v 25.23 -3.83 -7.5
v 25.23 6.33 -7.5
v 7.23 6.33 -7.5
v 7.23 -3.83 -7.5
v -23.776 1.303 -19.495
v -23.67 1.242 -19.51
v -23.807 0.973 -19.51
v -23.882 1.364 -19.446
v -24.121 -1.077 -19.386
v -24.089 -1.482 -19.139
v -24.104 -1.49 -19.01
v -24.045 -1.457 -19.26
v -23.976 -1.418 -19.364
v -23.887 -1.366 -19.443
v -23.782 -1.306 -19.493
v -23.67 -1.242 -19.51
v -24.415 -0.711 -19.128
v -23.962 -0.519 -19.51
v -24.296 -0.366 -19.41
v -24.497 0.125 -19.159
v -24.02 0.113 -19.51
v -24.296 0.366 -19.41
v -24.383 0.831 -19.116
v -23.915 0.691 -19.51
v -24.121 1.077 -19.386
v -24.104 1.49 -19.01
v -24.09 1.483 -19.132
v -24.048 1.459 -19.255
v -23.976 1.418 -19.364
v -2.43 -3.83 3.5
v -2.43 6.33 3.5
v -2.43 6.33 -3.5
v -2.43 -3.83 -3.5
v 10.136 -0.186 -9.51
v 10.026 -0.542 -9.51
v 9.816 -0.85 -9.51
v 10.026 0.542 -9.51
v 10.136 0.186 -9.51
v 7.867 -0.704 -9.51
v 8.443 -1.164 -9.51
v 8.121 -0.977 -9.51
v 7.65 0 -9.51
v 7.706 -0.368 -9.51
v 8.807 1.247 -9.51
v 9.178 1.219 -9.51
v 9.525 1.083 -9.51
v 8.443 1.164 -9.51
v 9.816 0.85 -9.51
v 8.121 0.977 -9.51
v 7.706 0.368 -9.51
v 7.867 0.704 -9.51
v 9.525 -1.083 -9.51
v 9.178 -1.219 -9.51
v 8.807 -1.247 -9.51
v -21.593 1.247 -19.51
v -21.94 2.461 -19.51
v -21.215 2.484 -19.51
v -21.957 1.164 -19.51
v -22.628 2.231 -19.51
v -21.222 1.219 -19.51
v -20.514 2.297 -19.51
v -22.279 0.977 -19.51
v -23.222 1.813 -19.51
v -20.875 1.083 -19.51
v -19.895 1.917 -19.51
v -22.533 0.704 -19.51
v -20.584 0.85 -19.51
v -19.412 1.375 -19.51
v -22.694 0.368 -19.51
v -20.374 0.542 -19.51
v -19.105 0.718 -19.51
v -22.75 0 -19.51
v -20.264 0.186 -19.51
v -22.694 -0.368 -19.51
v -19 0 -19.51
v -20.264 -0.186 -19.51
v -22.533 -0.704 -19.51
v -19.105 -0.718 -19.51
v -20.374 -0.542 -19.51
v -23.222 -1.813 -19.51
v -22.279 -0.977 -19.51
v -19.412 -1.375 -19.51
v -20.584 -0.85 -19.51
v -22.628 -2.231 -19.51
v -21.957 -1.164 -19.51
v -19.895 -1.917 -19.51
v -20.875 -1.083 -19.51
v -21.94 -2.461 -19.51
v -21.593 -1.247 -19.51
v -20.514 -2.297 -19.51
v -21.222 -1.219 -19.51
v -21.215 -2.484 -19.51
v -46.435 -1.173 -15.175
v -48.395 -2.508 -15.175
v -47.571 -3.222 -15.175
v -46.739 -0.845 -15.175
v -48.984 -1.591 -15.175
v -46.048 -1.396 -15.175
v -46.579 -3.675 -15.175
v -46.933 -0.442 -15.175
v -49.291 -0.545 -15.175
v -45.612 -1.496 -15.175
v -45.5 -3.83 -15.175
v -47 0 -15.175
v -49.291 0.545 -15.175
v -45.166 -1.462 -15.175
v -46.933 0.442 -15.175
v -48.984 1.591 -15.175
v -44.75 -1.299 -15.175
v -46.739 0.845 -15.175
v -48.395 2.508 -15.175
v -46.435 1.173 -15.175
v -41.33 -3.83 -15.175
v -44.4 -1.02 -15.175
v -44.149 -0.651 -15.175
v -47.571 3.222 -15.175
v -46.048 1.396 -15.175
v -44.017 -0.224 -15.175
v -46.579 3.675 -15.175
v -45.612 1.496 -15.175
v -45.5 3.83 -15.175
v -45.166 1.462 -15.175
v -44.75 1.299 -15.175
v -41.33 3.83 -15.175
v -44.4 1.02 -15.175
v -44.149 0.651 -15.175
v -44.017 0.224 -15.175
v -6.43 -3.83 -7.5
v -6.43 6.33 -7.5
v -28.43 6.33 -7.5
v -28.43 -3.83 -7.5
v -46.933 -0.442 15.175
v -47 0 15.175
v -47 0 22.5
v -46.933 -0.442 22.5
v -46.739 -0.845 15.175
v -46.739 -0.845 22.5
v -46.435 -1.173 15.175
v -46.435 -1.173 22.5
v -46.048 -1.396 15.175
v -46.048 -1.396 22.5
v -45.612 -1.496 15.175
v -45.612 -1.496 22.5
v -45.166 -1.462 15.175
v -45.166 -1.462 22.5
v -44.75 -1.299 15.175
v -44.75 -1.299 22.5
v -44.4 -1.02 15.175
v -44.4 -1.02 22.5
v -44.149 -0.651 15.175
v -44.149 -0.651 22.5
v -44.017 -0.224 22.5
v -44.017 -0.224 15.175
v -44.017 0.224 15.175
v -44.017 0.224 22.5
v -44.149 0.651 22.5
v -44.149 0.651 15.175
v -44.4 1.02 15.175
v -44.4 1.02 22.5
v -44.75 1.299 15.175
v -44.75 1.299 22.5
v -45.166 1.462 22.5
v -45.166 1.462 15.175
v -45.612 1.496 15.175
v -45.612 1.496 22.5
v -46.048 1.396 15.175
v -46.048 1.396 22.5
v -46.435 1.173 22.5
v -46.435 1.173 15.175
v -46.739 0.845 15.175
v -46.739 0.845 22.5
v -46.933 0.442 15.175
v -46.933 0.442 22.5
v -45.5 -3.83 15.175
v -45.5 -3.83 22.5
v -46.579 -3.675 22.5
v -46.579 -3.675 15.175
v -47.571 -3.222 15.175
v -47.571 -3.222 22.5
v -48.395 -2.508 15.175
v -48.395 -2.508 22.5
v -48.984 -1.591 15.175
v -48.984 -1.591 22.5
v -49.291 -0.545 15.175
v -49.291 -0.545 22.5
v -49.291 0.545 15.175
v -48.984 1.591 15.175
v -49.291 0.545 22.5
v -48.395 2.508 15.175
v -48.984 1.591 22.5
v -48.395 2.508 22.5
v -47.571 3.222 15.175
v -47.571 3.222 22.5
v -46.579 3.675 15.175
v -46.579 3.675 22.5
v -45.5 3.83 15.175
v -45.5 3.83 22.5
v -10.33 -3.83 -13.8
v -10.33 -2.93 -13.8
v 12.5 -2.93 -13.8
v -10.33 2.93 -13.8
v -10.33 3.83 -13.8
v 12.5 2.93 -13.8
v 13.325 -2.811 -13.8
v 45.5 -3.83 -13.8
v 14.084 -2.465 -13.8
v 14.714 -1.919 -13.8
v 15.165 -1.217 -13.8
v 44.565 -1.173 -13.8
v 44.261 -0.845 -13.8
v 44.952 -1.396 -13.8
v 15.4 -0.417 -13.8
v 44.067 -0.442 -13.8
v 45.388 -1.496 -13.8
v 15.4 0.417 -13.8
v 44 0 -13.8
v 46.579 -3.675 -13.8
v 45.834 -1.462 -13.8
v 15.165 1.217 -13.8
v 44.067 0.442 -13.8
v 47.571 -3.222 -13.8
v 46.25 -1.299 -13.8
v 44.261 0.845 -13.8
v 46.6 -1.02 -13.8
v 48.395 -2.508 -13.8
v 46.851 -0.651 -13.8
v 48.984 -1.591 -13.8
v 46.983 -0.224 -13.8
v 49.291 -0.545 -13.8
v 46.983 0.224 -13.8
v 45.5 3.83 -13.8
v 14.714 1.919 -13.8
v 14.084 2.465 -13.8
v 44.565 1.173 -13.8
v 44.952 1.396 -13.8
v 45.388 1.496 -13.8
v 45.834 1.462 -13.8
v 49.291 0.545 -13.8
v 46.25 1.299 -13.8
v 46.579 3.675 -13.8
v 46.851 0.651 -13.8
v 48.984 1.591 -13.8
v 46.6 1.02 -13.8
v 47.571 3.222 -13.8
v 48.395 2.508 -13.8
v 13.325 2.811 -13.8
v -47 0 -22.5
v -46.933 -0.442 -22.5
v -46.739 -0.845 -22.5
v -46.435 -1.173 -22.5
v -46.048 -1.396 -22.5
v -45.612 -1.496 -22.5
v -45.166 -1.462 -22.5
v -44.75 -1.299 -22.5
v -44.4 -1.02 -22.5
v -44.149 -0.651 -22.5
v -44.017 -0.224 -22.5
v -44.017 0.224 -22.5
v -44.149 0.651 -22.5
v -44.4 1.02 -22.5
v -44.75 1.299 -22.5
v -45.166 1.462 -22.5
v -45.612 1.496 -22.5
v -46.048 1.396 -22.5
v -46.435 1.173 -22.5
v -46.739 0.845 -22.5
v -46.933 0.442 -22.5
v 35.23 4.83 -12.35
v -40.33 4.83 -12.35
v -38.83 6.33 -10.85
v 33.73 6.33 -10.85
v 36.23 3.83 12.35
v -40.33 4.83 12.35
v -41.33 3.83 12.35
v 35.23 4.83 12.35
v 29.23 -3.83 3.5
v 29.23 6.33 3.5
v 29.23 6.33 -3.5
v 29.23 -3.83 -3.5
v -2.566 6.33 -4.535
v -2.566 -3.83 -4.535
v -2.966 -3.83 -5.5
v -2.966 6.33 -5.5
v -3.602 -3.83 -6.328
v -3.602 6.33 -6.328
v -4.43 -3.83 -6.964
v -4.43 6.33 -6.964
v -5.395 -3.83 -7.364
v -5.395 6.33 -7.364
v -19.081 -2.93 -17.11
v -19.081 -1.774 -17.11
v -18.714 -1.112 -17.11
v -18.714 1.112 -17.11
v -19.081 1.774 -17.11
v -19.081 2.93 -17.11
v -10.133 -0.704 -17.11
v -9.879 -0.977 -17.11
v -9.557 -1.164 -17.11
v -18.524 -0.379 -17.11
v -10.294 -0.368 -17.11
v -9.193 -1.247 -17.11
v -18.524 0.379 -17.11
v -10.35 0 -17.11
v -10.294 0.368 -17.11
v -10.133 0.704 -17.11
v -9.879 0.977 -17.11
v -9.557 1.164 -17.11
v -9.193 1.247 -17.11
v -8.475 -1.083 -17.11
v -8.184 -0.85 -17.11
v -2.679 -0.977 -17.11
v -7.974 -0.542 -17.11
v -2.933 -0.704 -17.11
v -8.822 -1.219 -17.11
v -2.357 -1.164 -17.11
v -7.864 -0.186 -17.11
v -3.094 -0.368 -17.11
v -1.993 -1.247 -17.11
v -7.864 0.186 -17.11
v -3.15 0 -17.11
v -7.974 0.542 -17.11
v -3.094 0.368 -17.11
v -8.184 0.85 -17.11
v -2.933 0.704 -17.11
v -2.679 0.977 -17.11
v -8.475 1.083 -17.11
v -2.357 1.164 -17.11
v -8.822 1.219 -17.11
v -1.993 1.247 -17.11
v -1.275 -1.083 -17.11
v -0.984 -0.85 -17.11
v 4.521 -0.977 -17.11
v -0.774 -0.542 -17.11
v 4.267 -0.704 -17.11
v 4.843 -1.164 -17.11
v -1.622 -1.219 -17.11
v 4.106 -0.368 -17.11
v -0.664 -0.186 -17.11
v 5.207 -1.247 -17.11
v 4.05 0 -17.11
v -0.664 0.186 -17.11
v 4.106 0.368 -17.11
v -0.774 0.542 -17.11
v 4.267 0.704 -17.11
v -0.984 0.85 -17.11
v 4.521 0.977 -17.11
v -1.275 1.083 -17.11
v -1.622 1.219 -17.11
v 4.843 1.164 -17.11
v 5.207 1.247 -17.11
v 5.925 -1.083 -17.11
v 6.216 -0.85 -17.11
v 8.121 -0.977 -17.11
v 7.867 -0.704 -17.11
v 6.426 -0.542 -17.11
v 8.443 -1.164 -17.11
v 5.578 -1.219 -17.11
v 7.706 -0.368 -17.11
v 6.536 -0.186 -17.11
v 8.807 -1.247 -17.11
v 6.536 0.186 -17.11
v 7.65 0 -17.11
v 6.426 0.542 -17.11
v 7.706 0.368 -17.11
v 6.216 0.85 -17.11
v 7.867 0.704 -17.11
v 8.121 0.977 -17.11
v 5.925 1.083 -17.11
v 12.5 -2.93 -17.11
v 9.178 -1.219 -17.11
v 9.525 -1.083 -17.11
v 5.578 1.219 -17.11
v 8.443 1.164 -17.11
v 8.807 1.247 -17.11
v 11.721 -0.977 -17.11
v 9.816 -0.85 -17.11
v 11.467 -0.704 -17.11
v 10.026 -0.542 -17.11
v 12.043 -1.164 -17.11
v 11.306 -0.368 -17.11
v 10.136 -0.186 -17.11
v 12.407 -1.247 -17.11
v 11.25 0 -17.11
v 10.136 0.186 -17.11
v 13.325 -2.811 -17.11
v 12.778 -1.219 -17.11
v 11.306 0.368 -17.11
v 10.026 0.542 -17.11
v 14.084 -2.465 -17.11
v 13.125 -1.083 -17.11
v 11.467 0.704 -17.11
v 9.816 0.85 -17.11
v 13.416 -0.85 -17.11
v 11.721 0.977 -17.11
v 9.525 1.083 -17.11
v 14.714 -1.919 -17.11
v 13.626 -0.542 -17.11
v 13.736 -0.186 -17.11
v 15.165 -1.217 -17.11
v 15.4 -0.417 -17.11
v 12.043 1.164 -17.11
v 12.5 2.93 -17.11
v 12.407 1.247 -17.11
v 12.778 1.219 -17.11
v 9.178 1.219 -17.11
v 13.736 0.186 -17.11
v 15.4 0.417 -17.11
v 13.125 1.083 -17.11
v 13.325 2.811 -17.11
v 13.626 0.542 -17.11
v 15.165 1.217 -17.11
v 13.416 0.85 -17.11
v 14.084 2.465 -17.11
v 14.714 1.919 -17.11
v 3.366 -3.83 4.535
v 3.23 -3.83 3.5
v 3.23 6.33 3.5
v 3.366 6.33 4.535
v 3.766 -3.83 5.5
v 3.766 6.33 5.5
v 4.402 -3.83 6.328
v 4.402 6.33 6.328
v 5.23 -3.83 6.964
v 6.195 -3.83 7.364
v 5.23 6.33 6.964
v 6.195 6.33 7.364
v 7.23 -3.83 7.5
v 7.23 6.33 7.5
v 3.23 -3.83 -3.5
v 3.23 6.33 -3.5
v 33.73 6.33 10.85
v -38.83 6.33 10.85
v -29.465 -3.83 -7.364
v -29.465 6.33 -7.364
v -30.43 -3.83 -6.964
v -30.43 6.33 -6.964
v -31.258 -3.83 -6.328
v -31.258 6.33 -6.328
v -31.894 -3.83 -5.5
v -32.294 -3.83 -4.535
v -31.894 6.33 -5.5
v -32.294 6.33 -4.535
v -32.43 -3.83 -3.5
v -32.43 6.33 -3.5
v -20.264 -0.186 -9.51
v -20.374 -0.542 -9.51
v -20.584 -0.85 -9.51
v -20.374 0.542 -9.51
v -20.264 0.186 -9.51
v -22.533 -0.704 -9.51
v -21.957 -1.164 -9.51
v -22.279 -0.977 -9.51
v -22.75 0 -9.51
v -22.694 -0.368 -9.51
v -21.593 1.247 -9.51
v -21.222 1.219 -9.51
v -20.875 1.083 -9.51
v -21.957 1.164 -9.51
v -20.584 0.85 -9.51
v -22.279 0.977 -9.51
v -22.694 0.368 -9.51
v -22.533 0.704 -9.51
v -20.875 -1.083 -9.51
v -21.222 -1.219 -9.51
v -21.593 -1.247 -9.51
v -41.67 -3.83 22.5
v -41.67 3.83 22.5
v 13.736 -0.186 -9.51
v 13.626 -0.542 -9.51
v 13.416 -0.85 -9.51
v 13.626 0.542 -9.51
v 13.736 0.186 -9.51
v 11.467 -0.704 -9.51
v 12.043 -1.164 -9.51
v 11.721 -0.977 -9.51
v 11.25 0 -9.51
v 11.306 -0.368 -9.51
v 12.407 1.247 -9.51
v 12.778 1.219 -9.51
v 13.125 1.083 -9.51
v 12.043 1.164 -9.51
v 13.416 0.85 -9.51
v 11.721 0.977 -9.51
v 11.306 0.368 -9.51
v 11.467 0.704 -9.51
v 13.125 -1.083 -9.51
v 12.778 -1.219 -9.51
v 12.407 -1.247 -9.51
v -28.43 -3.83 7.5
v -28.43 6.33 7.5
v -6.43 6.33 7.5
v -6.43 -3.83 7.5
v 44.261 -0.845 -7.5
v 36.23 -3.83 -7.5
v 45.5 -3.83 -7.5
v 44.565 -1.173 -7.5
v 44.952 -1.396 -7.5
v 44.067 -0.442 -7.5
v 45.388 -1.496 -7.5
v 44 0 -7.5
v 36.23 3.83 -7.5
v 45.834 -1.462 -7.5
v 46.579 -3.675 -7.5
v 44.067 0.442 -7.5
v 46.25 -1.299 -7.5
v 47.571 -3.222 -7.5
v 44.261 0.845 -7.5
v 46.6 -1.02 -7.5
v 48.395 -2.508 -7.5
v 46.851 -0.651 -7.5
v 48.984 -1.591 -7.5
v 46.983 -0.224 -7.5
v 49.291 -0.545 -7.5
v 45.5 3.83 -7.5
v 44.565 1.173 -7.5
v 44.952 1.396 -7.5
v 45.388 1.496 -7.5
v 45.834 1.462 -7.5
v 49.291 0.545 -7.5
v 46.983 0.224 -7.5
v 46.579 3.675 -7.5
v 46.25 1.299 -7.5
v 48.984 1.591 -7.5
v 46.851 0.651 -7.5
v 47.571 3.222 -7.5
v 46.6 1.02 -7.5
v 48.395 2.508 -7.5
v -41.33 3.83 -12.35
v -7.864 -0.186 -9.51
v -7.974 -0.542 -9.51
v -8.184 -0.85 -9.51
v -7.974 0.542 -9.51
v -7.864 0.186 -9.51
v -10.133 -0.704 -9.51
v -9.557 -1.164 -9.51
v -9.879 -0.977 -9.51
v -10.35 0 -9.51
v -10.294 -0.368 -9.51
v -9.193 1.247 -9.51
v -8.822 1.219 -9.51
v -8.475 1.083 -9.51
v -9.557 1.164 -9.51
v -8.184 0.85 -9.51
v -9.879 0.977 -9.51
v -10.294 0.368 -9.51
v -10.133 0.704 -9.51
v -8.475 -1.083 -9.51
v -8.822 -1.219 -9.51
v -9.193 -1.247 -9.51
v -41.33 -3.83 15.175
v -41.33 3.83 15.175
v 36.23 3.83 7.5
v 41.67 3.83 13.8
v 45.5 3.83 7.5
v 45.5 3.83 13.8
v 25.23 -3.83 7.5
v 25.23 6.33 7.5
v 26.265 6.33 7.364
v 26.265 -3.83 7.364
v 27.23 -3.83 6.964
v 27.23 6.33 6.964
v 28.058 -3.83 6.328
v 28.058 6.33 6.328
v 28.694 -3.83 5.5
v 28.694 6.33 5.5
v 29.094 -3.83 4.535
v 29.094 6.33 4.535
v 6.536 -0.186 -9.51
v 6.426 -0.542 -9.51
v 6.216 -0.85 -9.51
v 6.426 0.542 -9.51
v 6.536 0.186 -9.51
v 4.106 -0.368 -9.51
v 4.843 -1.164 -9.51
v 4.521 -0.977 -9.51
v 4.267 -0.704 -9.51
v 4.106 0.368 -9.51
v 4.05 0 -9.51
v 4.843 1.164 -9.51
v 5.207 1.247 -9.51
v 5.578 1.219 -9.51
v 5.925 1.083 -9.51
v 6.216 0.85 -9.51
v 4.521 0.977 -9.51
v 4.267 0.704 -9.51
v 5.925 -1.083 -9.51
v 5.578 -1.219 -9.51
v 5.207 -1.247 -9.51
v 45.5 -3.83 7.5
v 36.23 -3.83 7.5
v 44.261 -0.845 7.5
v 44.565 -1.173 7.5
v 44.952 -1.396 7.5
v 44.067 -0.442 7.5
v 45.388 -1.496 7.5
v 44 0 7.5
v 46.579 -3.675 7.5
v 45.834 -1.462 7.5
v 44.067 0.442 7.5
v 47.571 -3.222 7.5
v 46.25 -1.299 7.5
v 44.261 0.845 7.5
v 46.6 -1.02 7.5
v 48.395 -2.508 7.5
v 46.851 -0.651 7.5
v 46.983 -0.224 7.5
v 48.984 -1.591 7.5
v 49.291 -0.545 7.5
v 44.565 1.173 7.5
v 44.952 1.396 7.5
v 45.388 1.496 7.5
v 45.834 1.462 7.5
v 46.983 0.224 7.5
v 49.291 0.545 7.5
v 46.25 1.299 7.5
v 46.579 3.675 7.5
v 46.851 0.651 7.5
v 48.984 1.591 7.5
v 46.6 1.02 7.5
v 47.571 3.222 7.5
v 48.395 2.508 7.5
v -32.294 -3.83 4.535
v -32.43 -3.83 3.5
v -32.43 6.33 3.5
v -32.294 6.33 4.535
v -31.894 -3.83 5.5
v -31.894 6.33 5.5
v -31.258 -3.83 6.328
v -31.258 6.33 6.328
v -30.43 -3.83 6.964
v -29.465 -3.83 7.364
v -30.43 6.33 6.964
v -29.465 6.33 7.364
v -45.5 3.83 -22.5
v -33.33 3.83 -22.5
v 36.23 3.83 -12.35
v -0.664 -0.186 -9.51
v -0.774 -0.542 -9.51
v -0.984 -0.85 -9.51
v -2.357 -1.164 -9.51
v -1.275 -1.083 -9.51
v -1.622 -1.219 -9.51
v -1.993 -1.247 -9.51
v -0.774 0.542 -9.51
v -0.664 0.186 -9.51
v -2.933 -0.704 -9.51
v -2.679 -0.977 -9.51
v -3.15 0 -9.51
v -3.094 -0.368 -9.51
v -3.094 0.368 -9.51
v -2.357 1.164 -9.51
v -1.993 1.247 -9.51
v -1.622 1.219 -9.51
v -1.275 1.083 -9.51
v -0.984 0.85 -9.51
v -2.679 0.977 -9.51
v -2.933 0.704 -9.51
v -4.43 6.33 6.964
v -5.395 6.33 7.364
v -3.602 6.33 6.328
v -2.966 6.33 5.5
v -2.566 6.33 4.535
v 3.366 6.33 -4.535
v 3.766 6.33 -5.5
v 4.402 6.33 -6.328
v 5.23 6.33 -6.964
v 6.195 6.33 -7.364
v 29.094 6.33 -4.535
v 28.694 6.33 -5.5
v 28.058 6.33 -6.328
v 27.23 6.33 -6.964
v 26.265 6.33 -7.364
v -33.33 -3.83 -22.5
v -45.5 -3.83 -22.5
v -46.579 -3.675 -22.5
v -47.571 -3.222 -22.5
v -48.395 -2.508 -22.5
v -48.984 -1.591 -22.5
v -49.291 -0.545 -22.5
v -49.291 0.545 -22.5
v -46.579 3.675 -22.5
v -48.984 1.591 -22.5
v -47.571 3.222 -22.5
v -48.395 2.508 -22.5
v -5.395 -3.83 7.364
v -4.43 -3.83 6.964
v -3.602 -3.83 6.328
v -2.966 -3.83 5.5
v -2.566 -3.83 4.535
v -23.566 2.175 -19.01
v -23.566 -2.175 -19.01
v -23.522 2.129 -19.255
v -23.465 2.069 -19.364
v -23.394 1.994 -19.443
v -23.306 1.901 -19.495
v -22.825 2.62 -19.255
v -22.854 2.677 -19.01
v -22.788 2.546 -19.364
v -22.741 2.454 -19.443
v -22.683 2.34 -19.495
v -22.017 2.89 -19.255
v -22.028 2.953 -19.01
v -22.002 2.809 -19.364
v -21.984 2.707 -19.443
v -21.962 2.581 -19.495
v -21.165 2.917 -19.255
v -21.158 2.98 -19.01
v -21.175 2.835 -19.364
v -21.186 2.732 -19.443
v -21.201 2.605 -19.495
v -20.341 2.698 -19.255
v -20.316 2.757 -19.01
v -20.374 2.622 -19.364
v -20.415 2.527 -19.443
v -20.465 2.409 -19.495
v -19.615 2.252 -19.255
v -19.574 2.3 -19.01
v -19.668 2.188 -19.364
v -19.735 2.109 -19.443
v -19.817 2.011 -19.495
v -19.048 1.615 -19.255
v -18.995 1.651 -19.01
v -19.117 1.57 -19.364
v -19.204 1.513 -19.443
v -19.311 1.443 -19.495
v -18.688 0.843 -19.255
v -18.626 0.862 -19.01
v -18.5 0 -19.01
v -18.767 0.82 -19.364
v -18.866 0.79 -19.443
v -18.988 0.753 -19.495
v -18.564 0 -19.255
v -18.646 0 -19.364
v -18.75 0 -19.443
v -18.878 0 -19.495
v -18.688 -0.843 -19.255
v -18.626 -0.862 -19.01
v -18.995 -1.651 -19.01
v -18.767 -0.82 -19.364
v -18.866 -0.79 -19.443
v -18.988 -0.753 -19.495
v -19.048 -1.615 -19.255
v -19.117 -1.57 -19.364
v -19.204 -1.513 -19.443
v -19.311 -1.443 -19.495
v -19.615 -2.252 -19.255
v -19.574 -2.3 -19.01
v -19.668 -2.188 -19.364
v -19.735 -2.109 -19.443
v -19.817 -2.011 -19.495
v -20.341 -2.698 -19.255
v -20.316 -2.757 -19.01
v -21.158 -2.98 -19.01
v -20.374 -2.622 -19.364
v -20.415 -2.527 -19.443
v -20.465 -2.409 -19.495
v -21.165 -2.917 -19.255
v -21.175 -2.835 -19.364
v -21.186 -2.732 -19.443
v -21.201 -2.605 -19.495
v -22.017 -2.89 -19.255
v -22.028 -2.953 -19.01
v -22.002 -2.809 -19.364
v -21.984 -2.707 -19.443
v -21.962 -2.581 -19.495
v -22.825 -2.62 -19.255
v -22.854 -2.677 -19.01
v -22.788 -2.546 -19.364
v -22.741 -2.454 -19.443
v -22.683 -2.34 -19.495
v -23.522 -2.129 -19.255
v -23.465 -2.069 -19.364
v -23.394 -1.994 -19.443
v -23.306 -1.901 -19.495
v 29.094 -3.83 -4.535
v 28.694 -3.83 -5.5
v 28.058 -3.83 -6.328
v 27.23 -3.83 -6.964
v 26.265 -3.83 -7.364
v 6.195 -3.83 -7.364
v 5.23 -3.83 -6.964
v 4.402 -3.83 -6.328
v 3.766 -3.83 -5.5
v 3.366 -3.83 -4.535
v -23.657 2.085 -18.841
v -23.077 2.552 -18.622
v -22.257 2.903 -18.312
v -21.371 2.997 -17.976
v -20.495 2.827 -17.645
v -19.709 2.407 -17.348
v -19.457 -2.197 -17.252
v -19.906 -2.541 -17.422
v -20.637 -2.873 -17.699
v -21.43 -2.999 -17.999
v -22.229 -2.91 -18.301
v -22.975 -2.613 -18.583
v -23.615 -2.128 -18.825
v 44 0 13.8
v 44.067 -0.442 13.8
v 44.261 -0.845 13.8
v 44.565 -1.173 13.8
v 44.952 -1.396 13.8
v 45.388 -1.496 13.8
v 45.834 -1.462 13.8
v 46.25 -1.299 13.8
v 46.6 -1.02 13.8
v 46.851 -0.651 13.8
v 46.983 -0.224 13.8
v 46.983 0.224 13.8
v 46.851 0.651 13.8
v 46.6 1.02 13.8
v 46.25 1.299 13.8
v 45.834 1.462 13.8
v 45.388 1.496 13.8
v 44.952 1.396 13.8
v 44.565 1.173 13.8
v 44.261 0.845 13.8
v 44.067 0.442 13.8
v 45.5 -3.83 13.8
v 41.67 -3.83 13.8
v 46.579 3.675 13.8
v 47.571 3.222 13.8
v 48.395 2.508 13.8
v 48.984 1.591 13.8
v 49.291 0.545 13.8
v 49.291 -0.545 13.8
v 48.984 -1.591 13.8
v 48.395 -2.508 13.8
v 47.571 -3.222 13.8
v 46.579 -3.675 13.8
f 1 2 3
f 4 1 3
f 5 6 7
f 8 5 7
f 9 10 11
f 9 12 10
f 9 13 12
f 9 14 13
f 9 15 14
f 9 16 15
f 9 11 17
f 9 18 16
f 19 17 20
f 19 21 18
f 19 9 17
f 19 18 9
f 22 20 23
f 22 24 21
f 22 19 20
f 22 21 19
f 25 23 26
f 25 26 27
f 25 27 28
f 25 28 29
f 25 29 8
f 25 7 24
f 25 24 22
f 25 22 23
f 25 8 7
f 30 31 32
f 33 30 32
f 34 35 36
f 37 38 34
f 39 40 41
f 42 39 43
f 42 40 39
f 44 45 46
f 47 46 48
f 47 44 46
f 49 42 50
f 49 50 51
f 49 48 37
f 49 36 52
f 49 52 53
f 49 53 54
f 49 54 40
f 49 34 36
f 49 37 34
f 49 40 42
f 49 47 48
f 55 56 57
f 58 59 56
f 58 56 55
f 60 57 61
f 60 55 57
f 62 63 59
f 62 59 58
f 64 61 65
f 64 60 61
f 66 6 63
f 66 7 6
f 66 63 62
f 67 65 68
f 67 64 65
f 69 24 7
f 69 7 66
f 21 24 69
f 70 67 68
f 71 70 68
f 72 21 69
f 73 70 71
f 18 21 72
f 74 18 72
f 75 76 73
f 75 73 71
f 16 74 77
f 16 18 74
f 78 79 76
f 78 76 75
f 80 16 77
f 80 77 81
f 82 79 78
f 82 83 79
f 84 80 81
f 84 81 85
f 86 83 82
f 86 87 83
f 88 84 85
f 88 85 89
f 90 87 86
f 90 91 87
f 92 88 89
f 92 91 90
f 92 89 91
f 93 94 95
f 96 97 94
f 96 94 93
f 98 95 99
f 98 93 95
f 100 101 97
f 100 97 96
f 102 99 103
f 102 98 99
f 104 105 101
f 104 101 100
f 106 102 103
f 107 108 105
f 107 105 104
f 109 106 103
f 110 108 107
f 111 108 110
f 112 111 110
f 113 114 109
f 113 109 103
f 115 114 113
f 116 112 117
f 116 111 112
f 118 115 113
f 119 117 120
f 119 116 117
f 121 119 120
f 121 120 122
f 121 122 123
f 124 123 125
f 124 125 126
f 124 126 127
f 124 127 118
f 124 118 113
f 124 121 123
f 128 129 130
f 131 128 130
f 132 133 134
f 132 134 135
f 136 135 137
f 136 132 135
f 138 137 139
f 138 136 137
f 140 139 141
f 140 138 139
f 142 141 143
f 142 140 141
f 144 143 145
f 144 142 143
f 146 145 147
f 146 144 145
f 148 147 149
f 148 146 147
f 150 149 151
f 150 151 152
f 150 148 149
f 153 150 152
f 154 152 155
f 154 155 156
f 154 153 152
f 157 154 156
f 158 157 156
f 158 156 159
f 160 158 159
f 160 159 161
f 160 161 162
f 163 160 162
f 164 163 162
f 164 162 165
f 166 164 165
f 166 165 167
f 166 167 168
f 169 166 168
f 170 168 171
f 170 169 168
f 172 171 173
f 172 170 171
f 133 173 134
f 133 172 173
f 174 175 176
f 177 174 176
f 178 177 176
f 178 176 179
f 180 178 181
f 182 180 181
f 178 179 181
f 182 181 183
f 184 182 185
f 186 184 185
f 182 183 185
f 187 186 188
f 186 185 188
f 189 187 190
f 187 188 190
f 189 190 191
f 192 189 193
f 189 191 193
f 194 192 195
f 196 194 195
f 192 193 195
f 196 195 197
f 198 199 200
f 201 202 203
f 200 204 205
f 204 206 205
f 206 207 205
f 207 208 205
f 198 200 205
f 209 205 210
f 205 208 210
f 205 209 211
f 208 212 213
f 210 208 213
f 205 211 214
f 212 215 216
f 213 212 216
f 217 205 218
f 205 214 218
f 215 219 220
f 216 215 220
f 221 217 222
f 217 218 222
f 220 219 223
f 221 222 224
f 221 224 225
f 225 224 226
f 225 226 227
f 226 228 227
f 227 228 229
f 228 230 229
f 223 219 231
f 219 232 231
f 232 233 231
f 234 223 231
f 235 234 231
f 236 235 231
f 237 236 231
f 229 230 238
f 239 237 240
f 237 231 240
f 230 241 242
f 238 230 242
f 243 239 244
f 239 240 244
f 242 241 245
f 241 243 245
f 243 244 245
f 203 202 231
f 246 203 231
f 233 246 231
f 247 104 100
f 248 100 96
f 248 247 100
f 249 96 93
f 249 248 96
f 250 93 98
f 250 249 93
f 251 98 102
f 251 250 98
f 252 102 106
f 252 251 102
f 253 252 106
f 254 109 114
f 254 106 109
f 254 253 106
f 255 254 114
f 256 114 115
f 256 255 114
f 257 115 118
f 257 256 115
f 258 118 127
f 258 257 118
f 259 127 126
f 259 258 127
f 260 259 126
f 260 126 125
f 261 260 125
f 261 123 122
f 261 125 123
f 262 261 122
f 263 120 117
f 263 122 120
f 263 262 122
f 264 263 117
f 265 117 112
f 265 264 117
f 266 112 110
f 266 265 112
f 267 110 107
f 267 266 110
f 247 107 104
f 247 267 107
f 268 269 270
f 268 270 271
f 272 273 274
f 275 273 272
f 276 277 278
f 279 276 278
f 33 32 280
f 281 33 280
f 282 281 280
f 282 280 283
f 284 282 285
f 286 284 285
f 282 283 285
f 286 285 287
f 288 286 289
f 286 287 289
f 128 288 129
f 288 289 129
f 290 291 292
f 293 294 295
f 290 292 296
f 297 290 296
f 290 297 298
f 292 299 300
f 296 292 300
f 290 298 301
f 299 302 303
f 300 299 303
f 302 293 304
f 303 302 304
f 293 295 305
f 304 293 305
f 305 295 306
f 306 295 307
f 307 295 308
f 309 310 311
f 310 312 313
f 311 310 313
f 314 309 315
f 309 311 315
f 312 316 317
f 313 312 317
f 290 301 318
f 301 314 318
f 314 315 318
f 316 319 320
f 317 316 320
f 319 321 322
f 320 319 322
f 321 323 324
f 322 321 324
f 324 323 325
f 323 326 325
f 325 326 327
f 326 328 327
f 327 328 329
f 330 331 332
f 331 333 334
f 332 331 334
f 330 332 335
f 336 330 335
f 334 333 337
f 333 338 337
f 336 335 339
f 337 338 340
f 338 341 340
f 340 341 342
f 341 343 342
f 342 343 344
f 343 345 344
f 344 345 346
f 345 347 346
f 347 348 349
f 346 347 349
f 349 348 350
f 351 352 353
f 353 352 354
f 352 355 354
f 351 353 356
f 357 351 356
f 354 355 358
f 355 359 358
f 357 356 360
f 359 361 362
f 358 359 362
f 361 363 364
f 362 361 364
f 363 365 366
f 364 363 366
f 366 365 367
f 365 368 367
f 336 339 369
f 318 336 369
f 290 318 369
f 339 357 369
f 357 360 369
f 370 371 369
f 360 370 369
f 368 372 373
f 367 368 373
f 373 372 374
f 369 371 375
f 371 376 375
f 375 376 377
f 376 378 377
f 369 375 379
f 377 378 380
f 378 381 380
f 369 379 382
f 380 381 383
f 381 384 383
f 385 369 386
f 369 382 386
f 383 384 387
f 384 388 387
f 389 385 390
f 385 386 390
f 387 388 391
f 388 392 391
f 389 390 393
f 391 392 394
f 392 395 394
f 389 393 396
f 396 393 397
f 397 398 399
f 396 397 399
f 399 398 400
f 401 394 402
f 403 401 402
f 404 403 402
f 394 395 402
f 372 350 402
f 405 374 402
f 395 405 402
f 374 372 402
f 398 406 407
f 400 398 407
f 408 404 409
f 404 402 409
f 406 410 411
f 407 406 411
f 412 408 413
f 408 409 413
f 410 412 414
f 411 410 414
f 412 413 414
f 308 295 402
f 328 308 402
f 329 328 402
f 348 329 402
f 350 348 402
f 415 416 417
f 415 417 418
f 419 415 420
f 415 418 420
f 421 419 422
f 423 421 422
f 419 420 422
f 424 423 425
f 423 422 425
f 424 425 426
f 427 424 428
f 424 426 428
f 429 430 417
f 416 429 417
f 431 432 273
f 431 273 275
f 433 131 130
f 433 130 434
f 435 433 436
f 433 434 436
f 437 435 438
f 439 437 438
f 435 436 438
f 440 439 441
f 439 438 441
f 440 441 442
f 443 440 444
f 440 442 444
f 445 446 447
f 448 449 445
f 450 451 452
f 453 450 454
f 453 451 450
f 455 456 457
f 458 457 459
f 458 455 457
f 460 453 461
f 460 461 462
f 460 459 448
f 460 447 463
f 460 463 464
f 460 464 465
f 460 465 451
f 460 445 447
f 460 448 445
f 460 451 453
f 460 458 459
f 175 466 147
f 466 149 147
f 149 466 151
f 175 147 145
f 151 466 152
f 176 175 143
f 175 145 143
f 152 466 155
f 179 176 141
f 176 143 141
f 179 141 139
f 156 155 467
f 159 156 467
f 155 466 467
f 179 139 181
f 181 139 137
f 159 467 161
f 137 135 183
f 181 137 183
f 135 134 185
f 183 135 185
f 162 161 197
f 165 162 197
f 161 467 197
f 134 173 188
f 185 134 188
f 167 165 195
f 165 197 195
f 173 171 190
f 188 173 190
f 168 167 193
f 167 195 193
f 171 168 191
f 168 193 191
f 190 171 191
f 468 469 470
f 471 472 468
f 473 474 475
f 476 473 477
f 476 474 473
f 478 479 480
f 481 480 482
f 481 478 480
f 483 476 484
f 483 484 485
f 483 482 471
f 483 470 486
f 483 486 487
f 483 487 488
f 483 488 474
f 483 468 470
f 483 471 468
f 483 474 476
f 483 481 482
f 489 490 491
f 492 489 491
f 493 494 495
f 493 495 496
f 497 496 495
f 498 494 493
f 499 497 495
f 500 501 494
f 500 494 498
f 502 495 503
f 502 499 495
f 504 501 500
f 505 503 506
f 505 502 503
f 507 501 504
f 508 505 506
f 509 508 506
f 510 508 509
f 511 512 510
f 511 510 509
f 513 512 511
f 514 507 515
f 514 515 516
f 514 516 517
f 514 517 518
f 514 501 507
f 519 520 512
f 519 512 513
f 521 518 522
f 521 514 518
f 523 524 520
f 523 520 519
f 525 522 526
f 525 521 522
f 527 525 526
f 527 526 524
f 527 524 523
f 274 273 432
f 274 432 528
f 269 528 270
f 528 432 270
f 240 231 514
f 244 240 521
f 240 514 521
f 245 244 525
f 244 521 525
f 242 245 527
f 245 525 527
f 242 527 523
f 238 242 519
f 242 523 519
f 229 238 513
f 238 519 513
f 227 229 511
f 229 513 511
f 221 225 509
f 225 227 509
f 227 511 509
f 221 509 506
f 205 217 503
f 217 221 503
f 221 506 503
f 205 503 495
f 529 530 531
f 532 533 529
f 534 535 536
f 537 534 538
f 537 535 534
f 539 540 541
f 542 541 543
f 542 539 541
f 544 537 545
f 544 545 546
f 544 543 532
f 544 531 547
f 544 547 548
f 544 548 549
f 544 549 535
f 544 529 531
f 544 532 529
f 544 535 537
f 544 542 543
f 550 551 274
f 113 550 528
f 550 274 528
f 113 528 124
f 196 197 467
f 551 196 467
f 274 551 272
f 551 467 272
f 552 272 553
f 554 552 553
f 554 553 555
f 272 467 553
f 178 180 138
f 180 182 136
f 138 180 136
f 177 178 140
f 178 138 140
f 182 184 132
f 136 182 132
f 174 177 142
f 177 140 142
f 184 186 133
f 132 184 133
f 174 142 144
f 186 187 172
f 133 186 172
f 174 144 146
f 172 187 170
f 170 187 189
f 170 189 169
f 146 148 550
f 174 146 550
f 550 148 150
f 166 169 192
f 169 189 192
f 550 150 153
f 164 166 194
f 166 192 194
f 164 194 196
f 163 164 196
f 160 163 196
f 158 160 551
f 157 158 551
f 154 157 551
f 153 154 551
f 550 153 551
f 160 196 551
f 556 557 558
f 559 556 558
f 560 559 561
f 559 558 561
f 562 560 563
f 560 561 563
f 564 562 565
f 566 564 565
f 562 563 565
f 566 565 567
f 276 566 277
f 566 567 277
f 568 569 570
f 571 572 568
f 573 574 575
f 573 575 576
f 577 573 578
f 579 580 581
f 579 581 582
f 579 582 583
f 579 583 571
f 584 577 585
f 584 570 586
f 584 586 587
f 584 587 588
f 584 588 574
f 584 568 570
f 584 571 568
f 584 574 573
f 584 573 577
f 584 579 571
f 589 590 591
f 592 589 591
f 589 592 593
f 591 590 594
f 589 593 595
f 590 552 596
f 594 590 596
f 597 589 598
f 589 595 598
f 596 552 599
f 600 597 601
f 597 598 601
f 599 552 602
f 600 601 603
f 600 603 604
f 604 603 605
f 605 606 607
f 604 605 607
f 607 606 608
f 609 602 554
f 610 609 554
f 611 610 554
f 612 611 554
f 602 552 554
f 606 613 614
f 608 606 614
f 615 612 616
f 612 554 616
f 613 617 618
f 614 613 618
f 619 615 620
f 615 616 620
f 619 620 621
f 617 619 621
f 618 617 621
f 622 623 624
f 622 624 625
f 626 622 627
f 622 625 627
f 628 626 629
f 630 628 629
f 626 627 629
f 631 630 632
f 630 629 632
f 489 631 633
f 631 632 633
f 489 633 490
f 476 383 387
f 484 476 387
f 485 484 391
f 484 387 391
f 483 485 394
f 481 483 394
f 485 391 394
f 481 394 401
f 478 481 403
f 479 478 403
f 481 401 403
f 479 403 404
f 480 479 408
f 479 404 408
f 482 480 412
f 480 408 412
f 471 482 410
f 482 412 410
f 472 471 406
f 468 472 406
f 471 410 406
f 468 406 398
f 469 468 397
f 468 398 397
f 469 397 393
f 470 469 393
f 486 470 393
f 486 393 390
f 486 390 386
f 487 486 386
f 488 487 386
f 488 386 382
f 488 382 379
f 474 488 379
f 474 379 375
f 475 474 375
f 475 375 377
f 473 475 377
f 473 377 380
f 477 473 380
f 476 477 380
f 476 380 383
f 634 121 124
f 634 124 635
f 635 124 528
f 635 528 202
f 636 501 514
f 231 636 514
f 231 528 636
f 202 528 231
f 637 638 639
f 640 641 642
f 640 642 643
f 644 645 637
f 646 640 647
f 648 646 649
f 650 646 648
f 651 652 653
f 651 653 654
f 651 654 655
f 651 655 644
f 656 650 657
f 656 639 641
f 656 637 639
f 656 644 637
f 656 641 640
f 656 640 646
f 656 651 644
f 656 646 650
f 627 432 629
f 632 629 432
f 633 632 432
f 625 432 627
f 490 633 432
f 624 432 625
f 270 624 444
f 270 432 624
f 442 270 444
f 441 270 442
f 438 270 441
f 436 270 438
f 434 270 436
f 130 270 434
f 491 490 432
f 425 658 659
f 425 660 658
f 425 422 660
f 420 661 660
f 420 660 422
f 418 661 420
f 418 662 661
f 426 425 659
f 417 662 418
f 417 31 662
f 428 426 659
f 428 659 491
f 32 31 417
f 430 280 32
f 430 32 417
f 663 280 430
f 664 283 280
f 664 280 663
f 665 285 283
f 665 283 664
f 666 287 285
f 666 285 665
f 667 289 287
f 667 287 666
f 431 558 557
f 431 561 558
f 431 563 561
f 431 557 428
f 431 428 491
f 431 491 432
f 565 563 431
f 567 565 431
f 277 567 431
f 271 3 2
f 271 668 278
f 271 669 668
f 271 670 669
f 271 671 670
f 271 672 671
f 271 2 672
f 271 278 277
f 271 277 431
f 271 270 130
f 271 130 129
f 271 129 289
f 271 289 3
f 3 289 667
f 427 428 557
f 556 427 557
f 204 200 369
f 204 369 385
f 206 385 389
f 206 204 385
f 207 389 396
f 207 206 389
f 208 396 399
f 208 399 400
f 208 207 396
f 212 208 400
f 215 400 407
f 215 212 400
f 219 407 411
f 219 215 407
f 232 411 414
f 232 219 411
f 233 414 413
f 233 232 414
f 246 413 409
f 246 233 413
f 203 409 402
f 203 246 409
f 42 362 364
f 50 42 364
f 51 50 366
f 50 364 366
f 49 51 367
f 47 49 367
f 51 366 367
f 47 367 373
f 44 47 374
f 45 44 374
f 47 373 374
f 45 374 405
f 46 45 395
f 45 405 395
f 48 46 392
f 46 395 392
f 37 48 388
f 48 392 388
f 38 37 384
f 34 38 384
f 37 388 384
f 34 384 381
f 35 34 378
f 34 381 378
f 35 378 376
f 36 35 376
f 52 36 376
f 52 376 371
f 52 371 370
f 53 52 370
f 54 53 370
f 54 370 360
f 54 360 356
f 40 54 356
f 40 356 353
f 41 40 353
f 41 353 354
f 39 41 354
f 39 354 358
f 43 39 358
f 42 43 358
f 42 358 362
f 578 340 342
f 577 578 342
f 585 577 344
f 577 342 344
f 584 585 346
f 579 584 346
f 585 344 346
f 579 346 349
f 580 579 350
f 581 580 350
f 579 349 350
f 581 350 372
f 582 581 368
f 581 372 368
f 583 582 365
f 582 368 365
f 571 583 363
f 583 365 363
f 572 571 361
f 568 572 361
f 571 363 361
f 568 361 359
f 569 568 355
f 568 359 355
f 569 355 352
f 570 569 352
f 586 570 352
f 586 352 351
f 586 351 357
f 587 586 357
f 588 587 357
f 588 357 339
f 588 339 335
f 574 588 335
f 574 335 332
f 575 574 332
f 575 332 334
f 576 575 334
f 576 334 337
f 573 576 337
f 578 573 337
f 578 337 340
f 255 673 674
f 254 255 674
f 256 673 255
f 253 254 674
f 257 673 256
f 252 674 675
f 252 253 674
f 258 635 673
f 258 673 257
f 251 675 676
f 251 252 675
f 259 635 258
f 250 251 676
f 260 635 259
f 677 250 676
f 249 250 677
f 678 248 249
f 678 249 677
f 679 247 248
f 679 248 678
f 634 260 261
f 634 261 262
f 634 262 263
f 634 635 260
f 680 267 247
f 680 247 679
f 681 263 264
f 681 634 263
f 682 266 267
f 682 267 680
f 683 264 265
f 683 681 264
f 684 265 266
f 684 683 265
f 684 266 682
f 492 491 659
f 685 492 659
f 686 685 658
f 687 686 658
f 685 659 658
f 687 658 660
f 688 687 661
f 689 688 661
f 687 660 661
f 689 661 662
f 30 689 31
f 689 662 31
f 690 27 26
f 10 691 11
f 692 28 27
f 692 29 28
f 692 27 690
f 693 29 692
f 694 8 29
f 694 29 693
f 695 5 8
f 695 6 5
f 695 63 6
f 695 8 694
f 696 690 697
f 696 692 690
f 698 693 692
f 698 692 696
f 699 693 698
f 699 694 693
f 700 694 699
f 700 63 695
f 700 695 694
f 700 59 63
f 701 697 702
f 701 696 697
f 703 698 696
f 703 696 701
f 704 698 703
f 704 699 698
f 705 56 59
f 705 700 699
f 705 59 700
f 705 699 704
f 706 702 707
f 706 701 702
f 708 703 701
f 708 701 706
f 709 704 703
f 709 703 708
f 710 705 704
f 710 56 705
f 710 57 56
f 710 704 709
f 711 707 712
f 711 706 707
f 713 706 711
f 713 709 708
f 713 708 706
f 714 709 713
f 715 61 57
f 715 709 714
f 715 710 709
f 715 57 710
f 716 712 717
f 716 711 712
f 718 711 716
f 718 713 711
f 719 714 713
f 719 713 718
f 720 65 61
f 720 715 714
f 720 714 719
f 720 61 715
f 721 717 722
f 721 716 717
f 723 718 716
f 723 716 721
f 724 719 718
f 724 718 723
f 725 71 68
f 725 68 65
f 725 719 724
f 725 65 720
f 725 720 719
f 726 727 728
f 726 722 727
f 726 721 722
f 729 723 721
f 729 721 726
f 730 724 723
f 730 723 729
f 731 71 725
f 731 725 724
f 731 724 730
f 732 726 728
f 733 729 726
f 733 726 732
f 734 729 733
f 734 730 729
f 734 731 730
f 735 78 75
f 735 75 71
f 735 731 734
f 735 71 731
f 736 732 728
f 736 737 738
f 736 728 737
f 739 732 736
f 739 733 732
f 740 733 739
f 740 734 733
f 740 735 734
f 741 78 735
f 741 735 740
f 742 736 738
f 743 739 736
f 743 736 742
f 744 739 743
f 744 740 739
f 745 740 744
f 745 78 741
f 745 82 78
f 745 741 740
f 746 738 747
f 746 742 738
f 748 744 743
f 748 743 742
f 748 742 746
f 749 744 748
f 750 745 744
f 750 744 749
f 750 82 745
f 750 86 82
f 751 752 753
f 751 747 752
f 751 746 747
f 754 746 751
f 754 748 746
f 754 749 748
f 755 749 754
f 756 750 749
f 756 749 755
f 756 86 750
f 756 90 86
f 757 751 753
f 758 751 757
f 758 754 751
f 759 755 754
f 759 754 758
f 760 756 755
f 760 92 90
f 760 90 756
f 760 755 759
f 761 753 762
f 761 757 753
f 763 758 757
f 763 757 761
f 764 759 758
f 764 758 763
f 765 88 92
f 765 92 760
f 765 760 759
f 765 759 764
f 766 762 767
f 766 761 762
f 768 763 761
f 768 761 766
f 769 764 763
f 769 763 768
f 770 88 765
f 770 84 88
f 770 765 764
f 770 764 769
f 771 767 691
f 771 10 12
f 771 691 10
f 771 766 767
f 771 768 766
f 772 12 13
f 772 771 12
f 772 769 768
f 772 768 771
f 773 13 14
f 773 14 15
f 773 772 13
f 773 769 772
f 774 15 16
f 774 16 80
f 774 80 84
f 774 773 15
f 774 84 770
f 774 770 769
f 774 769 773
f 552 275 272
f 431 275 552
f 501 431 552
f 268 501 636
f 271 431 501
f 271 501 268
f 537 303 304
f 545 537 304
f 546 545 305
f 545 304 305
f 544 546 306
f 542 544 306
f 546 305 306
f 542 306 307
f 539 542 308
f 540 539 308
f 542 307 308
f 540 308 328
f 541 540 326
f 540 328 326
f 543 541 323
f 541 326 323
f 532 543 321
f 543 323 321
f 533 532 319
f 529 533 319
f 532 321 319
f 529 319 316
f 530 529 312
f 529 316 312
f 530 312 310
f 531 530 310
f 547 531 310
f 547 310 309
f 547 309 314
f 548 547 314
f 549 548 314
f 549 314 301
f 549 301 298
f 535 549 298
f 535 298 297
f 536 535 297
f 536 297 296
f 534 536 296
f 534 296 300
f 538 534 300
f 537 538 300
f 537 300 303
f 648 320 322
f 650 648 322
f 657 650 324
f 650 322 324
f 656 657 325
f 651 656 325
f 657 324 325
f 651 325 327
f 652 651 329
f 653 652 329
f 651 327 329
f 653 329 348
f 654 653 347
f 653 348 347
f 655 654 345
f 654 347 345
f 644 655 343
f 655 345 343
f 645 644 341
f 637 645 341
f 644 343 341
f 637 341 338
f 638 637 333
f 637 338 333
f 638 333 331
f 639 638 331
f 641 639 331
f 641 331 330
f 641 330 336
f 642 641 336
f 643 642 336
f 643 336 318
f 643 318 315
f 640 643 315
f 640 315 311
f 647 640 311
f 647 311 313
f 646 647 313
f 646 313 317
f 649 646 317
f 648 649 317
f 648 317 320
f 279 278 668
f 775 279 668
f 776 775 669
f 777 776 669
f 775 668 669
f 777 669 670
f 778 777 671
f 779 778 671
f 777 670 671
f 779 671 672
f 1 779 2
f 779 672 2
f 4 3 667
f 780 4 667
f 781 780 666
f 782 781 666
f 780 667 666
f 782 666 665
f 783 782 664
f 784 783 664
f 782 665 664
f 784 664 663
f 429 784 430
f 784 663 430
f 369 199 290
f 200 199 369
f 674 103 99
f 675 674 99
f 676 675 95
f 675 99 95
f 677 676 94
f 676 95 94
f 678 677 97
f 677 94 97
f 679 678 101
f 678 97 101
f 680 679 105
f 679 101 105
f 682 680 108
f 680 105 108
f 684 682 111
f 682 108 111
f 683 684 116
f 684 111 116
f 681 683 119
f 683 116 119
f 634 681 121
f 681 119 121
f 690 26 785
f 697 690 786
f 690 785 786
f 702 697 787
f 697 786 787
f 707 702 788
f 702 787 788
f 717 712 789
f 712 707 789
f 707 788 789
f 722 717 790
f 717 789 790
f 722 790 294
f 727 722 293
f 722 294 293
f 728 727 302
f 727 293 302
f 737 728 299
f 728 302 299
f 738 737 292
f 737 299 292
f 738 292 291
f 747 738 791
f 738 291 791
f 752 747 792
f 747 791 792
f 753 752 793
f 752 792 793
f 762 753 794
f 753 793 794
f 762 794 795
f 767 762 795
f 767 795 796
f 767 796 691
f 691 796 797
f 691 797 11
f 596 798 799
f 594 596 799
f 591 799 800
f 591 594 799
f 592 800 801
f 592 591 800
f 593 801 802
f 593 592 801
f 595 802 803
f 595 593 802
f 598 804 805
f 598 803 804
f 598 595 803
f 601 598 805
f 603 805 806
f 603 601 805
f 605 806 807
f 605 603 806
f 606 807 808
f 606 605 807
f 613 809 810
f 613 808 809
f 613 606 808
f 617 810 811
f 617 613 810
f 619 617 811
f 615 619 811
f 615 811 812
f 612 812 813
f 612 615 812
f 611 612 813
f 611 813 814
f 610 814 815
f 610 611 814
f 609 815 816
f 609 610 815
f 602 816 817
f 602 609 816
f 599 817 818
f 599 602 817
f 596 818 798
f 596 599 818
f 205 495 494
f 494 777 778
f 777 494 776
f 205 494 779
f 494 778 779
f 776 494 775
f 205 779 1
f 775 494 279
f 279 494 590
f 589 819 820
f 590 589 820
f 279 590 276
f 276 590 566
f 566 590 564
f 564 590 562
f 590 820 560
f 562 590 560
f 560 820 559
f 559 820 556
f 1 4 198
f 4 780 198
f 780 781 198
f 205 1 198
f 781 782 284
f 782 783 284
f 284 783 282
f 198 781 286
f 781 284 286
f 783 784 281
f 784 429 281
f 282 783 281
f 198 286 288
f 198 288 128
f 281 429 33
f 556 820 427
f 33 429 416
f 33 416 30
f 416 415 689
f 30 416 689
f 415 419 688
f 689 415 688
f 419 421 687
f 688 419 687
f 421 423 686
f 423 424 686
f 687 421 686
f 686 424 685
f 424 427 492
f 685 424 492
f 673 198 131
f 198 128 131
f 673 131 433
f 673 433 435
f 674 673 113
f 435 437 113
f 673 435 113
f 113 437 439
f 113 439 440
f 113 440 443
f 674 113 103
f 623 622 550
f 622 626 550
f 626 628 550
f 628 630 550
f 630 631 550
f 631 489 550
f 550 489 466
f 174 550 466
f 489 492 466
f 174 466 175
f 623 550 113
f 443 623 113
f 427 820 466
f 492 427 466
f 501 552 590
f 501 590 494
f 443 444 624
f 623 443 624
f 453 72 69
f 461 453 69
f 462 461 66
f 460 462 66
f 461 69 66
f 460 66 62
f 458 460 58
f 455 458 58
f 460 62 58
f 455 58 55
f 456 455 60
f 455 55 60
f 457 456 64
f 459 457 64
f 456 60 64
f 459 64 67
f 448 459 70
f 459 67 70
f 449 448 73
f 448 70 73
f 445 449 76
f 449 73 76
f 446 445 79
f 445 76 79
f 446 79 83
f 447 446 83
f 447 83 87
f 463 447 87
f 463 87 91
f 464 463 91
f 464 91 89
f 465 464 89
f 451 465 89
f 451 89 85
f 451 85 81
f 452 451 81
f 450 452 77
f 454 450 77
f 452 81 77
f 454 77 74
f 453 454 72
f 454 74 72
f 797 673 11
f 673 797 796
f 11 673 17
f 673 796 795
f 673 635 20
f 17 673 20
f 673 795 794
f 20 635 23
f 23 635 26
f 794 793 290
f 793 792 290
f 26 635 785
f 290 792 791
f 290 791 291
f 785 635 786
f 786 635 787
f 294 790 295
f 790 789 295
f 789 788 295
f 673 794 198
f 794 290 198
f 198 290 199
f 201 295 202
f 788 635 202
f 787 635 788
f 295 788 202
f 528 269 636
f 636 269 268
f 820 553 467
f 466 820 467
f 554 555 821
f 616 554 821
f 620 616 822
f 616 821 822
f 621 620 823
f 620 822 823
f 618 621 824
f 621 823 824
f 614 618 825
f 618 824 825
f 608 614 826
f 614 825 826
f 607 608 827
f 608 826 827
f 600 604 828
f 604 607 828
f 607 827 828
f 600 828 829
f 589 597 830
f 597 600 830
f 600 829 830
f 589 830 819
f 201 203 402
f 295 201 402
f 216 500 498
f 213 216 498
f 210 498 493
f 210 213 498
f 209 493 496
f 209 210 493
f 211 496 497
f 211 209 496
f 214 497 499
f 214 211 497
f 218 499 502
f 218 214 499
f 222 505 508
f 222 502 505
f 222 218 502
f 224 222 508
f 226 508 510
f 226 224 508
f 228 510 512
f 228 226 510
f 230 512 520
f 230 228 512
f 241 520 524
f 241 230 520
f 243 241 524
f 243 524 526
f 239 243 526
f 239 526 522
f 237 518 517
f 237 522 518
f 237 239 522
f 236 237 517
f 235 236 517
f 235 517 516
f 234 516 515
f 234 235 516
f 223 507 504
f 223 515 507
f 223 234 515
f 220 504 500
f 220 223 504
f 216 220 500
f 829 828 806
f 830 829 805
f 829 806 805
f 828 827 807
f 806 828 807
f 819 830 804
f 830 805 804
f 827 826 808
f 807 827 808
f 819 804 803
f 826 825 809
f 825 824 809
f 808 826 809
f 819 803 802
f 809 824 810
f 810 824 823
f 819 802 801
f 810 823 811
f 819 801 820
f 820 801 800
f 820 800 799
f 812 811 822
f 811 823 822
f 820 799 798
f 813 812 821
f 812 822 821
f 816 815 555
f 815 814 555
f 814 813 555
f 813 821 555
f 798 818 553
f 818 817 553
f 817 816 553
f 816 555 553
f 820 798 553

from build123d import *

# Parameters (mm, degrees)
SKETCH1_R           = 1.5
BOSS_EXTRUDE1_DEPTH = 22.5
SKETCH2_W           = 3.83
SKETCH2_H           = 8.7
SKETCH2_W_2         = 8
SKETCH2_H_2         = 30.35
SKETCH2_W_3         = 13.1
SKETCH2_H_3         = 15
CUT_EXTRUDE1_DEPTH  = 55.757415023
BOSS_EXTRUDE2_START = 6.33
SKETCH3_W           = 77.56
SKETCH3_H           = 24.7
BOSS_EXTRUDE2_DEPTH = 6.33
CHAMFER1_SIZE       = 2.5
CHAMFER2_SIZE       = 1.5
BOSS_EXTRUDE3_DEPTH = 3.31
SKETCH5_R           = 3
BOSS_EXTRUDE4_DEPTH = 2.4
FILLET1_R           = 0.5
SKETCH6_R           = 1.25
CUT_EXTRUDE2_DEPTH  = 10


with BuildPart() as part:
    # Sketch1 → Boss-Extrude1 (new, symmetric)
    with BuildSketch(Plane.XY):
        with BuildLine():
            Line((-45.5, 3.83), (45.5, 3.83))
            ThreePointArc((45.5, 3.83), (49.33, 0), (45.5, -3.83))
            Line((45.5, -3.83), (-45.5, -3.83))
            ThreePointArc((-45.5, -3.83), (-49.33, 0), (-45.5, 3.83))
        make_face()
        with Locations(Location((-45.5, 0, 0), (0, 0, 180))):
            Circle(SKETCH1_R, mode=Mode.SUBTRACT)
        with Locations(Location((45.5, 0, 0), (0, 0, 180))):
            Circle(SKETCH1_R, mode=Mode.SUBTRACT)
    extrude(amount=BOSS_EXTRUDE1_DEPTH, both=True)

    # Sketch2 → Cut-Extrude1 (cut, through all)
    with BuildSketch(Plane(origin=(0, 3.83, 0), x_dir=(1, 0, 0), z_dir=(0, 1, 0))):
        Polygon((-10.33, 13.8), (45.5, 13.8), (45.5, 22.5), (-33.33, 22.5), align=None)
        Polygon((41.67, -13.8), (-41.67, -22.5), (45.5, -22.5), (45.5, -13.8), align=None)
        with Locations((47.415, -18.15)):
            Rectangle(SKETCH2_W, SKETCH2_H)
        with Locations((47.415, 18.15)):
            Rectangle(SKETCH2_W, SKETCH2_H)
        with BuildLine():
            Line((-6.43, 7.5), (-28.43, 7.5))
            ThreePointArc((-28.43, 7.5), (-31.258427125, 6.328427125), (-32.43, 3.5))
            Line((-32.43, 3.5), (-32.43, -3.5))
            ThreePointArc((-32.43, -3.5), (-31.258427125, -6.328427125), (-28.43, -7.5))
            Line((-28.43, -7.5), (-6.43, -7.5))
            ThreePointArc((-6.43, -7.5), (-3.601572875, -6.328427125), (-2.43, -3.5))
            Line((-2.43, -3.5), (-2.43, 3.5))
            ThreePointArc((-2.43, 3.5), (-3.601572875, 6.328427125), (-6.43, 7.5))
        make_face()
        with BuildLine():
            Line((25.23, 7.5), (7.23, 7.5))
            ThreePointArc((7.23, 7.5), (4.401572875, 6.328427125), (3.23, 3.5))
            Line((3.23, 3.5), (3.23, -3.5))
            ThreePointArc((3.23, -3.5), (4.401572875, -6.328427125), (7.23, -7.5))
            Line((7.23, -7.5), (25.23, -7.5))
            ThreePointArc((25.23, -7.5), (28.058427125, -6.328427125), (29.23, -3.5))
            Line((29.23, -3.5), (29.23, 3.5))
            ThreePointArc((29.23, 3.5), (28.058427125, 6.328427125), (25.23, 7.5))
        make_face()
        with Locations((-45.33, 0)):
            Rectangle(SKETCH2_W_2, SKETCH2_H_2)
        with Locations((42.78, 0)):
            Rectangle(SKETCH2_W_3, SKETCH2_H_3)
    extrude(amount=-CUT_EXTRUDE1_DEPTH, mode=Mode.SUBTRACT)

    # Sketch3 → Boss-Extrude2 (add)
    with BuildSketch(Plane(origin=(0, 0, 0), x_dir=(1, 0, 0), z_dir=(0, 1, 0)).offset(BOSS_EXTRUDE2_START)):
        with Locations((-2.55, 0)):
            Rectangle(SKETCH3_W, SKETCH3_H)
        with BuildLine():
            ThreePointArc((3.23, -3.5), (4.401572875, -6.328427125), (7.23, -7.5))
            Line((7.23, -7.5), (25.23, -7.5))
            ThreePointArc((25.23, -7.5), (28.058427125, -6.328427125), (29.23, -3.5))
            Line((29.23, -3.5), (29.23, 3.5))
            ThreePointArc((29.23, 3.5), (28.058427125, 6.328427125), (25.23, 7.5))
            Line((25.23, 7.5), (7.23, 7.5))
            ThreePointArc((7.23, 7.5), (4.401572875, 6.328427125), (3.23, 3.5))
            Line((3.23, 3.5), (3.23, -3.5))
        make_face(mode=Mode.SUBTRACT)
        with BuildLine():
            ThreePointArc((-32.43, -3.5), (-31.258427125, -6.328427125), (-28.43, -7.5))
            Line((-28.43, -7.5), (-6.43, -7.5))
            ThreePointArc((-6.43, -7.5), (-3.601572875, -6.328427125), (-2.43, -3.5))
            Line((-2.43, -3.5), (-2.43, 3.5))
            ThreePointArc((-2.43, 3.5), (-3.601572875, 6.328427125), (-6.43, 7.5))
            Line((-6.43, 7.5), (-28.43, 7.5))
            ThreePointArc((-28.43, 7.5), (-31.258427125, 6.328427125), (-32.43, 3.5))
            Line((-32.43, 3.5), (-32.43, -3.5))
        make_face(mode=Mode.SUBTRACT)
    extrude(amount=-BOSS_EXTRUDE2_DEPTH)

    # Chamfer1
    chamfer1_edges = [part.edges().sort_by_distance(p)[0] for p in [
        (36.23, 6.33, 0),
        (-41.33, 6.33, 0),
    ]]
    chamfer(chamfer1_edges, length=CHAMFER1_SIZE)

    # Chamfer2
    chamfer2_edges = [part.edges().sort_by_distance(p)[0] for p in [
        (-2.55, 6.33, 12.35),
        (-2.55, 6.33, -12.35),
    ]]
    chamfer(chamfer2_edges, length=CHAMFER2_SIZE)

    # Sketch4 → Boss-Extrude3 (add)
    with BuildSketch(Plane(origin=(0, 0, -13.8), x_dir=(-1, 0, 0), z_dir=(0, 0, -1))):
        with BuildLine():
            Line((21.5, -2.93), (-12.5, -2.93))
            ThreePointArc((-12.5, -2.93), (-15.43, 0), (-12.5, 2.93))
            Line((-12.5, 2.93), (21.5, 2.93))
            ThreePointArc((21.5, 2.93), (24.43, 0), (21.5, -2.93))
        make_face()
    extrude(amount=BOSS_EXTRUDE3_DEPTH)

    # Sketch5 → Boss-Extrude4 (add)
    with BuildSketch(Plane(origin=(0, 0, -17.11), x_dir=(-1, 0, 0), z_dir=(0, 0, -1))):
        with Locations(Location((21.5, 0, 0), (0, 0, 216.247045378))):
            Circle(SKETCH5_R)
    extrude(amount=BOSS_EXTRUDE4_DEPTH)

    # Fillet1
    fillet1_edges = [part.edges().sort_by_distance(p)[0] for p in [
        (-23.919425287, 1.773804183, -19.51),
    ]]
    fillet(fillet1_edges, radius=FILLET1_R)

    # Sketch6 → Cut-Extrude2 (cut)
    with BuildSketch(Plane(origin=(0, 0, -19.51), x_dir=(-1, 0, 0), z_dir=(0, 0, -1))):
        with Locations((21.5, 0)):
            Circle(SKETCH6_R)
        with Locations((9.1, 0)):
            Circle(SKETCH6_R)
        with Locations((1.9, 0)):
            Circle(SKETCH6_R)
        with Locations((-5.3, 0)):
            Circle(SKETCH6_R)
        with Locations((-12.5, 0)):
            Circle(SKETCH6_R)
        with Locations((-8.9, 0)):
            Circle(SKETCH6_R)
    extrude(amount=-CUT_EXTRUDE2_DEPTH, mode=Mode.SUBTRACT)


solid = part.part
